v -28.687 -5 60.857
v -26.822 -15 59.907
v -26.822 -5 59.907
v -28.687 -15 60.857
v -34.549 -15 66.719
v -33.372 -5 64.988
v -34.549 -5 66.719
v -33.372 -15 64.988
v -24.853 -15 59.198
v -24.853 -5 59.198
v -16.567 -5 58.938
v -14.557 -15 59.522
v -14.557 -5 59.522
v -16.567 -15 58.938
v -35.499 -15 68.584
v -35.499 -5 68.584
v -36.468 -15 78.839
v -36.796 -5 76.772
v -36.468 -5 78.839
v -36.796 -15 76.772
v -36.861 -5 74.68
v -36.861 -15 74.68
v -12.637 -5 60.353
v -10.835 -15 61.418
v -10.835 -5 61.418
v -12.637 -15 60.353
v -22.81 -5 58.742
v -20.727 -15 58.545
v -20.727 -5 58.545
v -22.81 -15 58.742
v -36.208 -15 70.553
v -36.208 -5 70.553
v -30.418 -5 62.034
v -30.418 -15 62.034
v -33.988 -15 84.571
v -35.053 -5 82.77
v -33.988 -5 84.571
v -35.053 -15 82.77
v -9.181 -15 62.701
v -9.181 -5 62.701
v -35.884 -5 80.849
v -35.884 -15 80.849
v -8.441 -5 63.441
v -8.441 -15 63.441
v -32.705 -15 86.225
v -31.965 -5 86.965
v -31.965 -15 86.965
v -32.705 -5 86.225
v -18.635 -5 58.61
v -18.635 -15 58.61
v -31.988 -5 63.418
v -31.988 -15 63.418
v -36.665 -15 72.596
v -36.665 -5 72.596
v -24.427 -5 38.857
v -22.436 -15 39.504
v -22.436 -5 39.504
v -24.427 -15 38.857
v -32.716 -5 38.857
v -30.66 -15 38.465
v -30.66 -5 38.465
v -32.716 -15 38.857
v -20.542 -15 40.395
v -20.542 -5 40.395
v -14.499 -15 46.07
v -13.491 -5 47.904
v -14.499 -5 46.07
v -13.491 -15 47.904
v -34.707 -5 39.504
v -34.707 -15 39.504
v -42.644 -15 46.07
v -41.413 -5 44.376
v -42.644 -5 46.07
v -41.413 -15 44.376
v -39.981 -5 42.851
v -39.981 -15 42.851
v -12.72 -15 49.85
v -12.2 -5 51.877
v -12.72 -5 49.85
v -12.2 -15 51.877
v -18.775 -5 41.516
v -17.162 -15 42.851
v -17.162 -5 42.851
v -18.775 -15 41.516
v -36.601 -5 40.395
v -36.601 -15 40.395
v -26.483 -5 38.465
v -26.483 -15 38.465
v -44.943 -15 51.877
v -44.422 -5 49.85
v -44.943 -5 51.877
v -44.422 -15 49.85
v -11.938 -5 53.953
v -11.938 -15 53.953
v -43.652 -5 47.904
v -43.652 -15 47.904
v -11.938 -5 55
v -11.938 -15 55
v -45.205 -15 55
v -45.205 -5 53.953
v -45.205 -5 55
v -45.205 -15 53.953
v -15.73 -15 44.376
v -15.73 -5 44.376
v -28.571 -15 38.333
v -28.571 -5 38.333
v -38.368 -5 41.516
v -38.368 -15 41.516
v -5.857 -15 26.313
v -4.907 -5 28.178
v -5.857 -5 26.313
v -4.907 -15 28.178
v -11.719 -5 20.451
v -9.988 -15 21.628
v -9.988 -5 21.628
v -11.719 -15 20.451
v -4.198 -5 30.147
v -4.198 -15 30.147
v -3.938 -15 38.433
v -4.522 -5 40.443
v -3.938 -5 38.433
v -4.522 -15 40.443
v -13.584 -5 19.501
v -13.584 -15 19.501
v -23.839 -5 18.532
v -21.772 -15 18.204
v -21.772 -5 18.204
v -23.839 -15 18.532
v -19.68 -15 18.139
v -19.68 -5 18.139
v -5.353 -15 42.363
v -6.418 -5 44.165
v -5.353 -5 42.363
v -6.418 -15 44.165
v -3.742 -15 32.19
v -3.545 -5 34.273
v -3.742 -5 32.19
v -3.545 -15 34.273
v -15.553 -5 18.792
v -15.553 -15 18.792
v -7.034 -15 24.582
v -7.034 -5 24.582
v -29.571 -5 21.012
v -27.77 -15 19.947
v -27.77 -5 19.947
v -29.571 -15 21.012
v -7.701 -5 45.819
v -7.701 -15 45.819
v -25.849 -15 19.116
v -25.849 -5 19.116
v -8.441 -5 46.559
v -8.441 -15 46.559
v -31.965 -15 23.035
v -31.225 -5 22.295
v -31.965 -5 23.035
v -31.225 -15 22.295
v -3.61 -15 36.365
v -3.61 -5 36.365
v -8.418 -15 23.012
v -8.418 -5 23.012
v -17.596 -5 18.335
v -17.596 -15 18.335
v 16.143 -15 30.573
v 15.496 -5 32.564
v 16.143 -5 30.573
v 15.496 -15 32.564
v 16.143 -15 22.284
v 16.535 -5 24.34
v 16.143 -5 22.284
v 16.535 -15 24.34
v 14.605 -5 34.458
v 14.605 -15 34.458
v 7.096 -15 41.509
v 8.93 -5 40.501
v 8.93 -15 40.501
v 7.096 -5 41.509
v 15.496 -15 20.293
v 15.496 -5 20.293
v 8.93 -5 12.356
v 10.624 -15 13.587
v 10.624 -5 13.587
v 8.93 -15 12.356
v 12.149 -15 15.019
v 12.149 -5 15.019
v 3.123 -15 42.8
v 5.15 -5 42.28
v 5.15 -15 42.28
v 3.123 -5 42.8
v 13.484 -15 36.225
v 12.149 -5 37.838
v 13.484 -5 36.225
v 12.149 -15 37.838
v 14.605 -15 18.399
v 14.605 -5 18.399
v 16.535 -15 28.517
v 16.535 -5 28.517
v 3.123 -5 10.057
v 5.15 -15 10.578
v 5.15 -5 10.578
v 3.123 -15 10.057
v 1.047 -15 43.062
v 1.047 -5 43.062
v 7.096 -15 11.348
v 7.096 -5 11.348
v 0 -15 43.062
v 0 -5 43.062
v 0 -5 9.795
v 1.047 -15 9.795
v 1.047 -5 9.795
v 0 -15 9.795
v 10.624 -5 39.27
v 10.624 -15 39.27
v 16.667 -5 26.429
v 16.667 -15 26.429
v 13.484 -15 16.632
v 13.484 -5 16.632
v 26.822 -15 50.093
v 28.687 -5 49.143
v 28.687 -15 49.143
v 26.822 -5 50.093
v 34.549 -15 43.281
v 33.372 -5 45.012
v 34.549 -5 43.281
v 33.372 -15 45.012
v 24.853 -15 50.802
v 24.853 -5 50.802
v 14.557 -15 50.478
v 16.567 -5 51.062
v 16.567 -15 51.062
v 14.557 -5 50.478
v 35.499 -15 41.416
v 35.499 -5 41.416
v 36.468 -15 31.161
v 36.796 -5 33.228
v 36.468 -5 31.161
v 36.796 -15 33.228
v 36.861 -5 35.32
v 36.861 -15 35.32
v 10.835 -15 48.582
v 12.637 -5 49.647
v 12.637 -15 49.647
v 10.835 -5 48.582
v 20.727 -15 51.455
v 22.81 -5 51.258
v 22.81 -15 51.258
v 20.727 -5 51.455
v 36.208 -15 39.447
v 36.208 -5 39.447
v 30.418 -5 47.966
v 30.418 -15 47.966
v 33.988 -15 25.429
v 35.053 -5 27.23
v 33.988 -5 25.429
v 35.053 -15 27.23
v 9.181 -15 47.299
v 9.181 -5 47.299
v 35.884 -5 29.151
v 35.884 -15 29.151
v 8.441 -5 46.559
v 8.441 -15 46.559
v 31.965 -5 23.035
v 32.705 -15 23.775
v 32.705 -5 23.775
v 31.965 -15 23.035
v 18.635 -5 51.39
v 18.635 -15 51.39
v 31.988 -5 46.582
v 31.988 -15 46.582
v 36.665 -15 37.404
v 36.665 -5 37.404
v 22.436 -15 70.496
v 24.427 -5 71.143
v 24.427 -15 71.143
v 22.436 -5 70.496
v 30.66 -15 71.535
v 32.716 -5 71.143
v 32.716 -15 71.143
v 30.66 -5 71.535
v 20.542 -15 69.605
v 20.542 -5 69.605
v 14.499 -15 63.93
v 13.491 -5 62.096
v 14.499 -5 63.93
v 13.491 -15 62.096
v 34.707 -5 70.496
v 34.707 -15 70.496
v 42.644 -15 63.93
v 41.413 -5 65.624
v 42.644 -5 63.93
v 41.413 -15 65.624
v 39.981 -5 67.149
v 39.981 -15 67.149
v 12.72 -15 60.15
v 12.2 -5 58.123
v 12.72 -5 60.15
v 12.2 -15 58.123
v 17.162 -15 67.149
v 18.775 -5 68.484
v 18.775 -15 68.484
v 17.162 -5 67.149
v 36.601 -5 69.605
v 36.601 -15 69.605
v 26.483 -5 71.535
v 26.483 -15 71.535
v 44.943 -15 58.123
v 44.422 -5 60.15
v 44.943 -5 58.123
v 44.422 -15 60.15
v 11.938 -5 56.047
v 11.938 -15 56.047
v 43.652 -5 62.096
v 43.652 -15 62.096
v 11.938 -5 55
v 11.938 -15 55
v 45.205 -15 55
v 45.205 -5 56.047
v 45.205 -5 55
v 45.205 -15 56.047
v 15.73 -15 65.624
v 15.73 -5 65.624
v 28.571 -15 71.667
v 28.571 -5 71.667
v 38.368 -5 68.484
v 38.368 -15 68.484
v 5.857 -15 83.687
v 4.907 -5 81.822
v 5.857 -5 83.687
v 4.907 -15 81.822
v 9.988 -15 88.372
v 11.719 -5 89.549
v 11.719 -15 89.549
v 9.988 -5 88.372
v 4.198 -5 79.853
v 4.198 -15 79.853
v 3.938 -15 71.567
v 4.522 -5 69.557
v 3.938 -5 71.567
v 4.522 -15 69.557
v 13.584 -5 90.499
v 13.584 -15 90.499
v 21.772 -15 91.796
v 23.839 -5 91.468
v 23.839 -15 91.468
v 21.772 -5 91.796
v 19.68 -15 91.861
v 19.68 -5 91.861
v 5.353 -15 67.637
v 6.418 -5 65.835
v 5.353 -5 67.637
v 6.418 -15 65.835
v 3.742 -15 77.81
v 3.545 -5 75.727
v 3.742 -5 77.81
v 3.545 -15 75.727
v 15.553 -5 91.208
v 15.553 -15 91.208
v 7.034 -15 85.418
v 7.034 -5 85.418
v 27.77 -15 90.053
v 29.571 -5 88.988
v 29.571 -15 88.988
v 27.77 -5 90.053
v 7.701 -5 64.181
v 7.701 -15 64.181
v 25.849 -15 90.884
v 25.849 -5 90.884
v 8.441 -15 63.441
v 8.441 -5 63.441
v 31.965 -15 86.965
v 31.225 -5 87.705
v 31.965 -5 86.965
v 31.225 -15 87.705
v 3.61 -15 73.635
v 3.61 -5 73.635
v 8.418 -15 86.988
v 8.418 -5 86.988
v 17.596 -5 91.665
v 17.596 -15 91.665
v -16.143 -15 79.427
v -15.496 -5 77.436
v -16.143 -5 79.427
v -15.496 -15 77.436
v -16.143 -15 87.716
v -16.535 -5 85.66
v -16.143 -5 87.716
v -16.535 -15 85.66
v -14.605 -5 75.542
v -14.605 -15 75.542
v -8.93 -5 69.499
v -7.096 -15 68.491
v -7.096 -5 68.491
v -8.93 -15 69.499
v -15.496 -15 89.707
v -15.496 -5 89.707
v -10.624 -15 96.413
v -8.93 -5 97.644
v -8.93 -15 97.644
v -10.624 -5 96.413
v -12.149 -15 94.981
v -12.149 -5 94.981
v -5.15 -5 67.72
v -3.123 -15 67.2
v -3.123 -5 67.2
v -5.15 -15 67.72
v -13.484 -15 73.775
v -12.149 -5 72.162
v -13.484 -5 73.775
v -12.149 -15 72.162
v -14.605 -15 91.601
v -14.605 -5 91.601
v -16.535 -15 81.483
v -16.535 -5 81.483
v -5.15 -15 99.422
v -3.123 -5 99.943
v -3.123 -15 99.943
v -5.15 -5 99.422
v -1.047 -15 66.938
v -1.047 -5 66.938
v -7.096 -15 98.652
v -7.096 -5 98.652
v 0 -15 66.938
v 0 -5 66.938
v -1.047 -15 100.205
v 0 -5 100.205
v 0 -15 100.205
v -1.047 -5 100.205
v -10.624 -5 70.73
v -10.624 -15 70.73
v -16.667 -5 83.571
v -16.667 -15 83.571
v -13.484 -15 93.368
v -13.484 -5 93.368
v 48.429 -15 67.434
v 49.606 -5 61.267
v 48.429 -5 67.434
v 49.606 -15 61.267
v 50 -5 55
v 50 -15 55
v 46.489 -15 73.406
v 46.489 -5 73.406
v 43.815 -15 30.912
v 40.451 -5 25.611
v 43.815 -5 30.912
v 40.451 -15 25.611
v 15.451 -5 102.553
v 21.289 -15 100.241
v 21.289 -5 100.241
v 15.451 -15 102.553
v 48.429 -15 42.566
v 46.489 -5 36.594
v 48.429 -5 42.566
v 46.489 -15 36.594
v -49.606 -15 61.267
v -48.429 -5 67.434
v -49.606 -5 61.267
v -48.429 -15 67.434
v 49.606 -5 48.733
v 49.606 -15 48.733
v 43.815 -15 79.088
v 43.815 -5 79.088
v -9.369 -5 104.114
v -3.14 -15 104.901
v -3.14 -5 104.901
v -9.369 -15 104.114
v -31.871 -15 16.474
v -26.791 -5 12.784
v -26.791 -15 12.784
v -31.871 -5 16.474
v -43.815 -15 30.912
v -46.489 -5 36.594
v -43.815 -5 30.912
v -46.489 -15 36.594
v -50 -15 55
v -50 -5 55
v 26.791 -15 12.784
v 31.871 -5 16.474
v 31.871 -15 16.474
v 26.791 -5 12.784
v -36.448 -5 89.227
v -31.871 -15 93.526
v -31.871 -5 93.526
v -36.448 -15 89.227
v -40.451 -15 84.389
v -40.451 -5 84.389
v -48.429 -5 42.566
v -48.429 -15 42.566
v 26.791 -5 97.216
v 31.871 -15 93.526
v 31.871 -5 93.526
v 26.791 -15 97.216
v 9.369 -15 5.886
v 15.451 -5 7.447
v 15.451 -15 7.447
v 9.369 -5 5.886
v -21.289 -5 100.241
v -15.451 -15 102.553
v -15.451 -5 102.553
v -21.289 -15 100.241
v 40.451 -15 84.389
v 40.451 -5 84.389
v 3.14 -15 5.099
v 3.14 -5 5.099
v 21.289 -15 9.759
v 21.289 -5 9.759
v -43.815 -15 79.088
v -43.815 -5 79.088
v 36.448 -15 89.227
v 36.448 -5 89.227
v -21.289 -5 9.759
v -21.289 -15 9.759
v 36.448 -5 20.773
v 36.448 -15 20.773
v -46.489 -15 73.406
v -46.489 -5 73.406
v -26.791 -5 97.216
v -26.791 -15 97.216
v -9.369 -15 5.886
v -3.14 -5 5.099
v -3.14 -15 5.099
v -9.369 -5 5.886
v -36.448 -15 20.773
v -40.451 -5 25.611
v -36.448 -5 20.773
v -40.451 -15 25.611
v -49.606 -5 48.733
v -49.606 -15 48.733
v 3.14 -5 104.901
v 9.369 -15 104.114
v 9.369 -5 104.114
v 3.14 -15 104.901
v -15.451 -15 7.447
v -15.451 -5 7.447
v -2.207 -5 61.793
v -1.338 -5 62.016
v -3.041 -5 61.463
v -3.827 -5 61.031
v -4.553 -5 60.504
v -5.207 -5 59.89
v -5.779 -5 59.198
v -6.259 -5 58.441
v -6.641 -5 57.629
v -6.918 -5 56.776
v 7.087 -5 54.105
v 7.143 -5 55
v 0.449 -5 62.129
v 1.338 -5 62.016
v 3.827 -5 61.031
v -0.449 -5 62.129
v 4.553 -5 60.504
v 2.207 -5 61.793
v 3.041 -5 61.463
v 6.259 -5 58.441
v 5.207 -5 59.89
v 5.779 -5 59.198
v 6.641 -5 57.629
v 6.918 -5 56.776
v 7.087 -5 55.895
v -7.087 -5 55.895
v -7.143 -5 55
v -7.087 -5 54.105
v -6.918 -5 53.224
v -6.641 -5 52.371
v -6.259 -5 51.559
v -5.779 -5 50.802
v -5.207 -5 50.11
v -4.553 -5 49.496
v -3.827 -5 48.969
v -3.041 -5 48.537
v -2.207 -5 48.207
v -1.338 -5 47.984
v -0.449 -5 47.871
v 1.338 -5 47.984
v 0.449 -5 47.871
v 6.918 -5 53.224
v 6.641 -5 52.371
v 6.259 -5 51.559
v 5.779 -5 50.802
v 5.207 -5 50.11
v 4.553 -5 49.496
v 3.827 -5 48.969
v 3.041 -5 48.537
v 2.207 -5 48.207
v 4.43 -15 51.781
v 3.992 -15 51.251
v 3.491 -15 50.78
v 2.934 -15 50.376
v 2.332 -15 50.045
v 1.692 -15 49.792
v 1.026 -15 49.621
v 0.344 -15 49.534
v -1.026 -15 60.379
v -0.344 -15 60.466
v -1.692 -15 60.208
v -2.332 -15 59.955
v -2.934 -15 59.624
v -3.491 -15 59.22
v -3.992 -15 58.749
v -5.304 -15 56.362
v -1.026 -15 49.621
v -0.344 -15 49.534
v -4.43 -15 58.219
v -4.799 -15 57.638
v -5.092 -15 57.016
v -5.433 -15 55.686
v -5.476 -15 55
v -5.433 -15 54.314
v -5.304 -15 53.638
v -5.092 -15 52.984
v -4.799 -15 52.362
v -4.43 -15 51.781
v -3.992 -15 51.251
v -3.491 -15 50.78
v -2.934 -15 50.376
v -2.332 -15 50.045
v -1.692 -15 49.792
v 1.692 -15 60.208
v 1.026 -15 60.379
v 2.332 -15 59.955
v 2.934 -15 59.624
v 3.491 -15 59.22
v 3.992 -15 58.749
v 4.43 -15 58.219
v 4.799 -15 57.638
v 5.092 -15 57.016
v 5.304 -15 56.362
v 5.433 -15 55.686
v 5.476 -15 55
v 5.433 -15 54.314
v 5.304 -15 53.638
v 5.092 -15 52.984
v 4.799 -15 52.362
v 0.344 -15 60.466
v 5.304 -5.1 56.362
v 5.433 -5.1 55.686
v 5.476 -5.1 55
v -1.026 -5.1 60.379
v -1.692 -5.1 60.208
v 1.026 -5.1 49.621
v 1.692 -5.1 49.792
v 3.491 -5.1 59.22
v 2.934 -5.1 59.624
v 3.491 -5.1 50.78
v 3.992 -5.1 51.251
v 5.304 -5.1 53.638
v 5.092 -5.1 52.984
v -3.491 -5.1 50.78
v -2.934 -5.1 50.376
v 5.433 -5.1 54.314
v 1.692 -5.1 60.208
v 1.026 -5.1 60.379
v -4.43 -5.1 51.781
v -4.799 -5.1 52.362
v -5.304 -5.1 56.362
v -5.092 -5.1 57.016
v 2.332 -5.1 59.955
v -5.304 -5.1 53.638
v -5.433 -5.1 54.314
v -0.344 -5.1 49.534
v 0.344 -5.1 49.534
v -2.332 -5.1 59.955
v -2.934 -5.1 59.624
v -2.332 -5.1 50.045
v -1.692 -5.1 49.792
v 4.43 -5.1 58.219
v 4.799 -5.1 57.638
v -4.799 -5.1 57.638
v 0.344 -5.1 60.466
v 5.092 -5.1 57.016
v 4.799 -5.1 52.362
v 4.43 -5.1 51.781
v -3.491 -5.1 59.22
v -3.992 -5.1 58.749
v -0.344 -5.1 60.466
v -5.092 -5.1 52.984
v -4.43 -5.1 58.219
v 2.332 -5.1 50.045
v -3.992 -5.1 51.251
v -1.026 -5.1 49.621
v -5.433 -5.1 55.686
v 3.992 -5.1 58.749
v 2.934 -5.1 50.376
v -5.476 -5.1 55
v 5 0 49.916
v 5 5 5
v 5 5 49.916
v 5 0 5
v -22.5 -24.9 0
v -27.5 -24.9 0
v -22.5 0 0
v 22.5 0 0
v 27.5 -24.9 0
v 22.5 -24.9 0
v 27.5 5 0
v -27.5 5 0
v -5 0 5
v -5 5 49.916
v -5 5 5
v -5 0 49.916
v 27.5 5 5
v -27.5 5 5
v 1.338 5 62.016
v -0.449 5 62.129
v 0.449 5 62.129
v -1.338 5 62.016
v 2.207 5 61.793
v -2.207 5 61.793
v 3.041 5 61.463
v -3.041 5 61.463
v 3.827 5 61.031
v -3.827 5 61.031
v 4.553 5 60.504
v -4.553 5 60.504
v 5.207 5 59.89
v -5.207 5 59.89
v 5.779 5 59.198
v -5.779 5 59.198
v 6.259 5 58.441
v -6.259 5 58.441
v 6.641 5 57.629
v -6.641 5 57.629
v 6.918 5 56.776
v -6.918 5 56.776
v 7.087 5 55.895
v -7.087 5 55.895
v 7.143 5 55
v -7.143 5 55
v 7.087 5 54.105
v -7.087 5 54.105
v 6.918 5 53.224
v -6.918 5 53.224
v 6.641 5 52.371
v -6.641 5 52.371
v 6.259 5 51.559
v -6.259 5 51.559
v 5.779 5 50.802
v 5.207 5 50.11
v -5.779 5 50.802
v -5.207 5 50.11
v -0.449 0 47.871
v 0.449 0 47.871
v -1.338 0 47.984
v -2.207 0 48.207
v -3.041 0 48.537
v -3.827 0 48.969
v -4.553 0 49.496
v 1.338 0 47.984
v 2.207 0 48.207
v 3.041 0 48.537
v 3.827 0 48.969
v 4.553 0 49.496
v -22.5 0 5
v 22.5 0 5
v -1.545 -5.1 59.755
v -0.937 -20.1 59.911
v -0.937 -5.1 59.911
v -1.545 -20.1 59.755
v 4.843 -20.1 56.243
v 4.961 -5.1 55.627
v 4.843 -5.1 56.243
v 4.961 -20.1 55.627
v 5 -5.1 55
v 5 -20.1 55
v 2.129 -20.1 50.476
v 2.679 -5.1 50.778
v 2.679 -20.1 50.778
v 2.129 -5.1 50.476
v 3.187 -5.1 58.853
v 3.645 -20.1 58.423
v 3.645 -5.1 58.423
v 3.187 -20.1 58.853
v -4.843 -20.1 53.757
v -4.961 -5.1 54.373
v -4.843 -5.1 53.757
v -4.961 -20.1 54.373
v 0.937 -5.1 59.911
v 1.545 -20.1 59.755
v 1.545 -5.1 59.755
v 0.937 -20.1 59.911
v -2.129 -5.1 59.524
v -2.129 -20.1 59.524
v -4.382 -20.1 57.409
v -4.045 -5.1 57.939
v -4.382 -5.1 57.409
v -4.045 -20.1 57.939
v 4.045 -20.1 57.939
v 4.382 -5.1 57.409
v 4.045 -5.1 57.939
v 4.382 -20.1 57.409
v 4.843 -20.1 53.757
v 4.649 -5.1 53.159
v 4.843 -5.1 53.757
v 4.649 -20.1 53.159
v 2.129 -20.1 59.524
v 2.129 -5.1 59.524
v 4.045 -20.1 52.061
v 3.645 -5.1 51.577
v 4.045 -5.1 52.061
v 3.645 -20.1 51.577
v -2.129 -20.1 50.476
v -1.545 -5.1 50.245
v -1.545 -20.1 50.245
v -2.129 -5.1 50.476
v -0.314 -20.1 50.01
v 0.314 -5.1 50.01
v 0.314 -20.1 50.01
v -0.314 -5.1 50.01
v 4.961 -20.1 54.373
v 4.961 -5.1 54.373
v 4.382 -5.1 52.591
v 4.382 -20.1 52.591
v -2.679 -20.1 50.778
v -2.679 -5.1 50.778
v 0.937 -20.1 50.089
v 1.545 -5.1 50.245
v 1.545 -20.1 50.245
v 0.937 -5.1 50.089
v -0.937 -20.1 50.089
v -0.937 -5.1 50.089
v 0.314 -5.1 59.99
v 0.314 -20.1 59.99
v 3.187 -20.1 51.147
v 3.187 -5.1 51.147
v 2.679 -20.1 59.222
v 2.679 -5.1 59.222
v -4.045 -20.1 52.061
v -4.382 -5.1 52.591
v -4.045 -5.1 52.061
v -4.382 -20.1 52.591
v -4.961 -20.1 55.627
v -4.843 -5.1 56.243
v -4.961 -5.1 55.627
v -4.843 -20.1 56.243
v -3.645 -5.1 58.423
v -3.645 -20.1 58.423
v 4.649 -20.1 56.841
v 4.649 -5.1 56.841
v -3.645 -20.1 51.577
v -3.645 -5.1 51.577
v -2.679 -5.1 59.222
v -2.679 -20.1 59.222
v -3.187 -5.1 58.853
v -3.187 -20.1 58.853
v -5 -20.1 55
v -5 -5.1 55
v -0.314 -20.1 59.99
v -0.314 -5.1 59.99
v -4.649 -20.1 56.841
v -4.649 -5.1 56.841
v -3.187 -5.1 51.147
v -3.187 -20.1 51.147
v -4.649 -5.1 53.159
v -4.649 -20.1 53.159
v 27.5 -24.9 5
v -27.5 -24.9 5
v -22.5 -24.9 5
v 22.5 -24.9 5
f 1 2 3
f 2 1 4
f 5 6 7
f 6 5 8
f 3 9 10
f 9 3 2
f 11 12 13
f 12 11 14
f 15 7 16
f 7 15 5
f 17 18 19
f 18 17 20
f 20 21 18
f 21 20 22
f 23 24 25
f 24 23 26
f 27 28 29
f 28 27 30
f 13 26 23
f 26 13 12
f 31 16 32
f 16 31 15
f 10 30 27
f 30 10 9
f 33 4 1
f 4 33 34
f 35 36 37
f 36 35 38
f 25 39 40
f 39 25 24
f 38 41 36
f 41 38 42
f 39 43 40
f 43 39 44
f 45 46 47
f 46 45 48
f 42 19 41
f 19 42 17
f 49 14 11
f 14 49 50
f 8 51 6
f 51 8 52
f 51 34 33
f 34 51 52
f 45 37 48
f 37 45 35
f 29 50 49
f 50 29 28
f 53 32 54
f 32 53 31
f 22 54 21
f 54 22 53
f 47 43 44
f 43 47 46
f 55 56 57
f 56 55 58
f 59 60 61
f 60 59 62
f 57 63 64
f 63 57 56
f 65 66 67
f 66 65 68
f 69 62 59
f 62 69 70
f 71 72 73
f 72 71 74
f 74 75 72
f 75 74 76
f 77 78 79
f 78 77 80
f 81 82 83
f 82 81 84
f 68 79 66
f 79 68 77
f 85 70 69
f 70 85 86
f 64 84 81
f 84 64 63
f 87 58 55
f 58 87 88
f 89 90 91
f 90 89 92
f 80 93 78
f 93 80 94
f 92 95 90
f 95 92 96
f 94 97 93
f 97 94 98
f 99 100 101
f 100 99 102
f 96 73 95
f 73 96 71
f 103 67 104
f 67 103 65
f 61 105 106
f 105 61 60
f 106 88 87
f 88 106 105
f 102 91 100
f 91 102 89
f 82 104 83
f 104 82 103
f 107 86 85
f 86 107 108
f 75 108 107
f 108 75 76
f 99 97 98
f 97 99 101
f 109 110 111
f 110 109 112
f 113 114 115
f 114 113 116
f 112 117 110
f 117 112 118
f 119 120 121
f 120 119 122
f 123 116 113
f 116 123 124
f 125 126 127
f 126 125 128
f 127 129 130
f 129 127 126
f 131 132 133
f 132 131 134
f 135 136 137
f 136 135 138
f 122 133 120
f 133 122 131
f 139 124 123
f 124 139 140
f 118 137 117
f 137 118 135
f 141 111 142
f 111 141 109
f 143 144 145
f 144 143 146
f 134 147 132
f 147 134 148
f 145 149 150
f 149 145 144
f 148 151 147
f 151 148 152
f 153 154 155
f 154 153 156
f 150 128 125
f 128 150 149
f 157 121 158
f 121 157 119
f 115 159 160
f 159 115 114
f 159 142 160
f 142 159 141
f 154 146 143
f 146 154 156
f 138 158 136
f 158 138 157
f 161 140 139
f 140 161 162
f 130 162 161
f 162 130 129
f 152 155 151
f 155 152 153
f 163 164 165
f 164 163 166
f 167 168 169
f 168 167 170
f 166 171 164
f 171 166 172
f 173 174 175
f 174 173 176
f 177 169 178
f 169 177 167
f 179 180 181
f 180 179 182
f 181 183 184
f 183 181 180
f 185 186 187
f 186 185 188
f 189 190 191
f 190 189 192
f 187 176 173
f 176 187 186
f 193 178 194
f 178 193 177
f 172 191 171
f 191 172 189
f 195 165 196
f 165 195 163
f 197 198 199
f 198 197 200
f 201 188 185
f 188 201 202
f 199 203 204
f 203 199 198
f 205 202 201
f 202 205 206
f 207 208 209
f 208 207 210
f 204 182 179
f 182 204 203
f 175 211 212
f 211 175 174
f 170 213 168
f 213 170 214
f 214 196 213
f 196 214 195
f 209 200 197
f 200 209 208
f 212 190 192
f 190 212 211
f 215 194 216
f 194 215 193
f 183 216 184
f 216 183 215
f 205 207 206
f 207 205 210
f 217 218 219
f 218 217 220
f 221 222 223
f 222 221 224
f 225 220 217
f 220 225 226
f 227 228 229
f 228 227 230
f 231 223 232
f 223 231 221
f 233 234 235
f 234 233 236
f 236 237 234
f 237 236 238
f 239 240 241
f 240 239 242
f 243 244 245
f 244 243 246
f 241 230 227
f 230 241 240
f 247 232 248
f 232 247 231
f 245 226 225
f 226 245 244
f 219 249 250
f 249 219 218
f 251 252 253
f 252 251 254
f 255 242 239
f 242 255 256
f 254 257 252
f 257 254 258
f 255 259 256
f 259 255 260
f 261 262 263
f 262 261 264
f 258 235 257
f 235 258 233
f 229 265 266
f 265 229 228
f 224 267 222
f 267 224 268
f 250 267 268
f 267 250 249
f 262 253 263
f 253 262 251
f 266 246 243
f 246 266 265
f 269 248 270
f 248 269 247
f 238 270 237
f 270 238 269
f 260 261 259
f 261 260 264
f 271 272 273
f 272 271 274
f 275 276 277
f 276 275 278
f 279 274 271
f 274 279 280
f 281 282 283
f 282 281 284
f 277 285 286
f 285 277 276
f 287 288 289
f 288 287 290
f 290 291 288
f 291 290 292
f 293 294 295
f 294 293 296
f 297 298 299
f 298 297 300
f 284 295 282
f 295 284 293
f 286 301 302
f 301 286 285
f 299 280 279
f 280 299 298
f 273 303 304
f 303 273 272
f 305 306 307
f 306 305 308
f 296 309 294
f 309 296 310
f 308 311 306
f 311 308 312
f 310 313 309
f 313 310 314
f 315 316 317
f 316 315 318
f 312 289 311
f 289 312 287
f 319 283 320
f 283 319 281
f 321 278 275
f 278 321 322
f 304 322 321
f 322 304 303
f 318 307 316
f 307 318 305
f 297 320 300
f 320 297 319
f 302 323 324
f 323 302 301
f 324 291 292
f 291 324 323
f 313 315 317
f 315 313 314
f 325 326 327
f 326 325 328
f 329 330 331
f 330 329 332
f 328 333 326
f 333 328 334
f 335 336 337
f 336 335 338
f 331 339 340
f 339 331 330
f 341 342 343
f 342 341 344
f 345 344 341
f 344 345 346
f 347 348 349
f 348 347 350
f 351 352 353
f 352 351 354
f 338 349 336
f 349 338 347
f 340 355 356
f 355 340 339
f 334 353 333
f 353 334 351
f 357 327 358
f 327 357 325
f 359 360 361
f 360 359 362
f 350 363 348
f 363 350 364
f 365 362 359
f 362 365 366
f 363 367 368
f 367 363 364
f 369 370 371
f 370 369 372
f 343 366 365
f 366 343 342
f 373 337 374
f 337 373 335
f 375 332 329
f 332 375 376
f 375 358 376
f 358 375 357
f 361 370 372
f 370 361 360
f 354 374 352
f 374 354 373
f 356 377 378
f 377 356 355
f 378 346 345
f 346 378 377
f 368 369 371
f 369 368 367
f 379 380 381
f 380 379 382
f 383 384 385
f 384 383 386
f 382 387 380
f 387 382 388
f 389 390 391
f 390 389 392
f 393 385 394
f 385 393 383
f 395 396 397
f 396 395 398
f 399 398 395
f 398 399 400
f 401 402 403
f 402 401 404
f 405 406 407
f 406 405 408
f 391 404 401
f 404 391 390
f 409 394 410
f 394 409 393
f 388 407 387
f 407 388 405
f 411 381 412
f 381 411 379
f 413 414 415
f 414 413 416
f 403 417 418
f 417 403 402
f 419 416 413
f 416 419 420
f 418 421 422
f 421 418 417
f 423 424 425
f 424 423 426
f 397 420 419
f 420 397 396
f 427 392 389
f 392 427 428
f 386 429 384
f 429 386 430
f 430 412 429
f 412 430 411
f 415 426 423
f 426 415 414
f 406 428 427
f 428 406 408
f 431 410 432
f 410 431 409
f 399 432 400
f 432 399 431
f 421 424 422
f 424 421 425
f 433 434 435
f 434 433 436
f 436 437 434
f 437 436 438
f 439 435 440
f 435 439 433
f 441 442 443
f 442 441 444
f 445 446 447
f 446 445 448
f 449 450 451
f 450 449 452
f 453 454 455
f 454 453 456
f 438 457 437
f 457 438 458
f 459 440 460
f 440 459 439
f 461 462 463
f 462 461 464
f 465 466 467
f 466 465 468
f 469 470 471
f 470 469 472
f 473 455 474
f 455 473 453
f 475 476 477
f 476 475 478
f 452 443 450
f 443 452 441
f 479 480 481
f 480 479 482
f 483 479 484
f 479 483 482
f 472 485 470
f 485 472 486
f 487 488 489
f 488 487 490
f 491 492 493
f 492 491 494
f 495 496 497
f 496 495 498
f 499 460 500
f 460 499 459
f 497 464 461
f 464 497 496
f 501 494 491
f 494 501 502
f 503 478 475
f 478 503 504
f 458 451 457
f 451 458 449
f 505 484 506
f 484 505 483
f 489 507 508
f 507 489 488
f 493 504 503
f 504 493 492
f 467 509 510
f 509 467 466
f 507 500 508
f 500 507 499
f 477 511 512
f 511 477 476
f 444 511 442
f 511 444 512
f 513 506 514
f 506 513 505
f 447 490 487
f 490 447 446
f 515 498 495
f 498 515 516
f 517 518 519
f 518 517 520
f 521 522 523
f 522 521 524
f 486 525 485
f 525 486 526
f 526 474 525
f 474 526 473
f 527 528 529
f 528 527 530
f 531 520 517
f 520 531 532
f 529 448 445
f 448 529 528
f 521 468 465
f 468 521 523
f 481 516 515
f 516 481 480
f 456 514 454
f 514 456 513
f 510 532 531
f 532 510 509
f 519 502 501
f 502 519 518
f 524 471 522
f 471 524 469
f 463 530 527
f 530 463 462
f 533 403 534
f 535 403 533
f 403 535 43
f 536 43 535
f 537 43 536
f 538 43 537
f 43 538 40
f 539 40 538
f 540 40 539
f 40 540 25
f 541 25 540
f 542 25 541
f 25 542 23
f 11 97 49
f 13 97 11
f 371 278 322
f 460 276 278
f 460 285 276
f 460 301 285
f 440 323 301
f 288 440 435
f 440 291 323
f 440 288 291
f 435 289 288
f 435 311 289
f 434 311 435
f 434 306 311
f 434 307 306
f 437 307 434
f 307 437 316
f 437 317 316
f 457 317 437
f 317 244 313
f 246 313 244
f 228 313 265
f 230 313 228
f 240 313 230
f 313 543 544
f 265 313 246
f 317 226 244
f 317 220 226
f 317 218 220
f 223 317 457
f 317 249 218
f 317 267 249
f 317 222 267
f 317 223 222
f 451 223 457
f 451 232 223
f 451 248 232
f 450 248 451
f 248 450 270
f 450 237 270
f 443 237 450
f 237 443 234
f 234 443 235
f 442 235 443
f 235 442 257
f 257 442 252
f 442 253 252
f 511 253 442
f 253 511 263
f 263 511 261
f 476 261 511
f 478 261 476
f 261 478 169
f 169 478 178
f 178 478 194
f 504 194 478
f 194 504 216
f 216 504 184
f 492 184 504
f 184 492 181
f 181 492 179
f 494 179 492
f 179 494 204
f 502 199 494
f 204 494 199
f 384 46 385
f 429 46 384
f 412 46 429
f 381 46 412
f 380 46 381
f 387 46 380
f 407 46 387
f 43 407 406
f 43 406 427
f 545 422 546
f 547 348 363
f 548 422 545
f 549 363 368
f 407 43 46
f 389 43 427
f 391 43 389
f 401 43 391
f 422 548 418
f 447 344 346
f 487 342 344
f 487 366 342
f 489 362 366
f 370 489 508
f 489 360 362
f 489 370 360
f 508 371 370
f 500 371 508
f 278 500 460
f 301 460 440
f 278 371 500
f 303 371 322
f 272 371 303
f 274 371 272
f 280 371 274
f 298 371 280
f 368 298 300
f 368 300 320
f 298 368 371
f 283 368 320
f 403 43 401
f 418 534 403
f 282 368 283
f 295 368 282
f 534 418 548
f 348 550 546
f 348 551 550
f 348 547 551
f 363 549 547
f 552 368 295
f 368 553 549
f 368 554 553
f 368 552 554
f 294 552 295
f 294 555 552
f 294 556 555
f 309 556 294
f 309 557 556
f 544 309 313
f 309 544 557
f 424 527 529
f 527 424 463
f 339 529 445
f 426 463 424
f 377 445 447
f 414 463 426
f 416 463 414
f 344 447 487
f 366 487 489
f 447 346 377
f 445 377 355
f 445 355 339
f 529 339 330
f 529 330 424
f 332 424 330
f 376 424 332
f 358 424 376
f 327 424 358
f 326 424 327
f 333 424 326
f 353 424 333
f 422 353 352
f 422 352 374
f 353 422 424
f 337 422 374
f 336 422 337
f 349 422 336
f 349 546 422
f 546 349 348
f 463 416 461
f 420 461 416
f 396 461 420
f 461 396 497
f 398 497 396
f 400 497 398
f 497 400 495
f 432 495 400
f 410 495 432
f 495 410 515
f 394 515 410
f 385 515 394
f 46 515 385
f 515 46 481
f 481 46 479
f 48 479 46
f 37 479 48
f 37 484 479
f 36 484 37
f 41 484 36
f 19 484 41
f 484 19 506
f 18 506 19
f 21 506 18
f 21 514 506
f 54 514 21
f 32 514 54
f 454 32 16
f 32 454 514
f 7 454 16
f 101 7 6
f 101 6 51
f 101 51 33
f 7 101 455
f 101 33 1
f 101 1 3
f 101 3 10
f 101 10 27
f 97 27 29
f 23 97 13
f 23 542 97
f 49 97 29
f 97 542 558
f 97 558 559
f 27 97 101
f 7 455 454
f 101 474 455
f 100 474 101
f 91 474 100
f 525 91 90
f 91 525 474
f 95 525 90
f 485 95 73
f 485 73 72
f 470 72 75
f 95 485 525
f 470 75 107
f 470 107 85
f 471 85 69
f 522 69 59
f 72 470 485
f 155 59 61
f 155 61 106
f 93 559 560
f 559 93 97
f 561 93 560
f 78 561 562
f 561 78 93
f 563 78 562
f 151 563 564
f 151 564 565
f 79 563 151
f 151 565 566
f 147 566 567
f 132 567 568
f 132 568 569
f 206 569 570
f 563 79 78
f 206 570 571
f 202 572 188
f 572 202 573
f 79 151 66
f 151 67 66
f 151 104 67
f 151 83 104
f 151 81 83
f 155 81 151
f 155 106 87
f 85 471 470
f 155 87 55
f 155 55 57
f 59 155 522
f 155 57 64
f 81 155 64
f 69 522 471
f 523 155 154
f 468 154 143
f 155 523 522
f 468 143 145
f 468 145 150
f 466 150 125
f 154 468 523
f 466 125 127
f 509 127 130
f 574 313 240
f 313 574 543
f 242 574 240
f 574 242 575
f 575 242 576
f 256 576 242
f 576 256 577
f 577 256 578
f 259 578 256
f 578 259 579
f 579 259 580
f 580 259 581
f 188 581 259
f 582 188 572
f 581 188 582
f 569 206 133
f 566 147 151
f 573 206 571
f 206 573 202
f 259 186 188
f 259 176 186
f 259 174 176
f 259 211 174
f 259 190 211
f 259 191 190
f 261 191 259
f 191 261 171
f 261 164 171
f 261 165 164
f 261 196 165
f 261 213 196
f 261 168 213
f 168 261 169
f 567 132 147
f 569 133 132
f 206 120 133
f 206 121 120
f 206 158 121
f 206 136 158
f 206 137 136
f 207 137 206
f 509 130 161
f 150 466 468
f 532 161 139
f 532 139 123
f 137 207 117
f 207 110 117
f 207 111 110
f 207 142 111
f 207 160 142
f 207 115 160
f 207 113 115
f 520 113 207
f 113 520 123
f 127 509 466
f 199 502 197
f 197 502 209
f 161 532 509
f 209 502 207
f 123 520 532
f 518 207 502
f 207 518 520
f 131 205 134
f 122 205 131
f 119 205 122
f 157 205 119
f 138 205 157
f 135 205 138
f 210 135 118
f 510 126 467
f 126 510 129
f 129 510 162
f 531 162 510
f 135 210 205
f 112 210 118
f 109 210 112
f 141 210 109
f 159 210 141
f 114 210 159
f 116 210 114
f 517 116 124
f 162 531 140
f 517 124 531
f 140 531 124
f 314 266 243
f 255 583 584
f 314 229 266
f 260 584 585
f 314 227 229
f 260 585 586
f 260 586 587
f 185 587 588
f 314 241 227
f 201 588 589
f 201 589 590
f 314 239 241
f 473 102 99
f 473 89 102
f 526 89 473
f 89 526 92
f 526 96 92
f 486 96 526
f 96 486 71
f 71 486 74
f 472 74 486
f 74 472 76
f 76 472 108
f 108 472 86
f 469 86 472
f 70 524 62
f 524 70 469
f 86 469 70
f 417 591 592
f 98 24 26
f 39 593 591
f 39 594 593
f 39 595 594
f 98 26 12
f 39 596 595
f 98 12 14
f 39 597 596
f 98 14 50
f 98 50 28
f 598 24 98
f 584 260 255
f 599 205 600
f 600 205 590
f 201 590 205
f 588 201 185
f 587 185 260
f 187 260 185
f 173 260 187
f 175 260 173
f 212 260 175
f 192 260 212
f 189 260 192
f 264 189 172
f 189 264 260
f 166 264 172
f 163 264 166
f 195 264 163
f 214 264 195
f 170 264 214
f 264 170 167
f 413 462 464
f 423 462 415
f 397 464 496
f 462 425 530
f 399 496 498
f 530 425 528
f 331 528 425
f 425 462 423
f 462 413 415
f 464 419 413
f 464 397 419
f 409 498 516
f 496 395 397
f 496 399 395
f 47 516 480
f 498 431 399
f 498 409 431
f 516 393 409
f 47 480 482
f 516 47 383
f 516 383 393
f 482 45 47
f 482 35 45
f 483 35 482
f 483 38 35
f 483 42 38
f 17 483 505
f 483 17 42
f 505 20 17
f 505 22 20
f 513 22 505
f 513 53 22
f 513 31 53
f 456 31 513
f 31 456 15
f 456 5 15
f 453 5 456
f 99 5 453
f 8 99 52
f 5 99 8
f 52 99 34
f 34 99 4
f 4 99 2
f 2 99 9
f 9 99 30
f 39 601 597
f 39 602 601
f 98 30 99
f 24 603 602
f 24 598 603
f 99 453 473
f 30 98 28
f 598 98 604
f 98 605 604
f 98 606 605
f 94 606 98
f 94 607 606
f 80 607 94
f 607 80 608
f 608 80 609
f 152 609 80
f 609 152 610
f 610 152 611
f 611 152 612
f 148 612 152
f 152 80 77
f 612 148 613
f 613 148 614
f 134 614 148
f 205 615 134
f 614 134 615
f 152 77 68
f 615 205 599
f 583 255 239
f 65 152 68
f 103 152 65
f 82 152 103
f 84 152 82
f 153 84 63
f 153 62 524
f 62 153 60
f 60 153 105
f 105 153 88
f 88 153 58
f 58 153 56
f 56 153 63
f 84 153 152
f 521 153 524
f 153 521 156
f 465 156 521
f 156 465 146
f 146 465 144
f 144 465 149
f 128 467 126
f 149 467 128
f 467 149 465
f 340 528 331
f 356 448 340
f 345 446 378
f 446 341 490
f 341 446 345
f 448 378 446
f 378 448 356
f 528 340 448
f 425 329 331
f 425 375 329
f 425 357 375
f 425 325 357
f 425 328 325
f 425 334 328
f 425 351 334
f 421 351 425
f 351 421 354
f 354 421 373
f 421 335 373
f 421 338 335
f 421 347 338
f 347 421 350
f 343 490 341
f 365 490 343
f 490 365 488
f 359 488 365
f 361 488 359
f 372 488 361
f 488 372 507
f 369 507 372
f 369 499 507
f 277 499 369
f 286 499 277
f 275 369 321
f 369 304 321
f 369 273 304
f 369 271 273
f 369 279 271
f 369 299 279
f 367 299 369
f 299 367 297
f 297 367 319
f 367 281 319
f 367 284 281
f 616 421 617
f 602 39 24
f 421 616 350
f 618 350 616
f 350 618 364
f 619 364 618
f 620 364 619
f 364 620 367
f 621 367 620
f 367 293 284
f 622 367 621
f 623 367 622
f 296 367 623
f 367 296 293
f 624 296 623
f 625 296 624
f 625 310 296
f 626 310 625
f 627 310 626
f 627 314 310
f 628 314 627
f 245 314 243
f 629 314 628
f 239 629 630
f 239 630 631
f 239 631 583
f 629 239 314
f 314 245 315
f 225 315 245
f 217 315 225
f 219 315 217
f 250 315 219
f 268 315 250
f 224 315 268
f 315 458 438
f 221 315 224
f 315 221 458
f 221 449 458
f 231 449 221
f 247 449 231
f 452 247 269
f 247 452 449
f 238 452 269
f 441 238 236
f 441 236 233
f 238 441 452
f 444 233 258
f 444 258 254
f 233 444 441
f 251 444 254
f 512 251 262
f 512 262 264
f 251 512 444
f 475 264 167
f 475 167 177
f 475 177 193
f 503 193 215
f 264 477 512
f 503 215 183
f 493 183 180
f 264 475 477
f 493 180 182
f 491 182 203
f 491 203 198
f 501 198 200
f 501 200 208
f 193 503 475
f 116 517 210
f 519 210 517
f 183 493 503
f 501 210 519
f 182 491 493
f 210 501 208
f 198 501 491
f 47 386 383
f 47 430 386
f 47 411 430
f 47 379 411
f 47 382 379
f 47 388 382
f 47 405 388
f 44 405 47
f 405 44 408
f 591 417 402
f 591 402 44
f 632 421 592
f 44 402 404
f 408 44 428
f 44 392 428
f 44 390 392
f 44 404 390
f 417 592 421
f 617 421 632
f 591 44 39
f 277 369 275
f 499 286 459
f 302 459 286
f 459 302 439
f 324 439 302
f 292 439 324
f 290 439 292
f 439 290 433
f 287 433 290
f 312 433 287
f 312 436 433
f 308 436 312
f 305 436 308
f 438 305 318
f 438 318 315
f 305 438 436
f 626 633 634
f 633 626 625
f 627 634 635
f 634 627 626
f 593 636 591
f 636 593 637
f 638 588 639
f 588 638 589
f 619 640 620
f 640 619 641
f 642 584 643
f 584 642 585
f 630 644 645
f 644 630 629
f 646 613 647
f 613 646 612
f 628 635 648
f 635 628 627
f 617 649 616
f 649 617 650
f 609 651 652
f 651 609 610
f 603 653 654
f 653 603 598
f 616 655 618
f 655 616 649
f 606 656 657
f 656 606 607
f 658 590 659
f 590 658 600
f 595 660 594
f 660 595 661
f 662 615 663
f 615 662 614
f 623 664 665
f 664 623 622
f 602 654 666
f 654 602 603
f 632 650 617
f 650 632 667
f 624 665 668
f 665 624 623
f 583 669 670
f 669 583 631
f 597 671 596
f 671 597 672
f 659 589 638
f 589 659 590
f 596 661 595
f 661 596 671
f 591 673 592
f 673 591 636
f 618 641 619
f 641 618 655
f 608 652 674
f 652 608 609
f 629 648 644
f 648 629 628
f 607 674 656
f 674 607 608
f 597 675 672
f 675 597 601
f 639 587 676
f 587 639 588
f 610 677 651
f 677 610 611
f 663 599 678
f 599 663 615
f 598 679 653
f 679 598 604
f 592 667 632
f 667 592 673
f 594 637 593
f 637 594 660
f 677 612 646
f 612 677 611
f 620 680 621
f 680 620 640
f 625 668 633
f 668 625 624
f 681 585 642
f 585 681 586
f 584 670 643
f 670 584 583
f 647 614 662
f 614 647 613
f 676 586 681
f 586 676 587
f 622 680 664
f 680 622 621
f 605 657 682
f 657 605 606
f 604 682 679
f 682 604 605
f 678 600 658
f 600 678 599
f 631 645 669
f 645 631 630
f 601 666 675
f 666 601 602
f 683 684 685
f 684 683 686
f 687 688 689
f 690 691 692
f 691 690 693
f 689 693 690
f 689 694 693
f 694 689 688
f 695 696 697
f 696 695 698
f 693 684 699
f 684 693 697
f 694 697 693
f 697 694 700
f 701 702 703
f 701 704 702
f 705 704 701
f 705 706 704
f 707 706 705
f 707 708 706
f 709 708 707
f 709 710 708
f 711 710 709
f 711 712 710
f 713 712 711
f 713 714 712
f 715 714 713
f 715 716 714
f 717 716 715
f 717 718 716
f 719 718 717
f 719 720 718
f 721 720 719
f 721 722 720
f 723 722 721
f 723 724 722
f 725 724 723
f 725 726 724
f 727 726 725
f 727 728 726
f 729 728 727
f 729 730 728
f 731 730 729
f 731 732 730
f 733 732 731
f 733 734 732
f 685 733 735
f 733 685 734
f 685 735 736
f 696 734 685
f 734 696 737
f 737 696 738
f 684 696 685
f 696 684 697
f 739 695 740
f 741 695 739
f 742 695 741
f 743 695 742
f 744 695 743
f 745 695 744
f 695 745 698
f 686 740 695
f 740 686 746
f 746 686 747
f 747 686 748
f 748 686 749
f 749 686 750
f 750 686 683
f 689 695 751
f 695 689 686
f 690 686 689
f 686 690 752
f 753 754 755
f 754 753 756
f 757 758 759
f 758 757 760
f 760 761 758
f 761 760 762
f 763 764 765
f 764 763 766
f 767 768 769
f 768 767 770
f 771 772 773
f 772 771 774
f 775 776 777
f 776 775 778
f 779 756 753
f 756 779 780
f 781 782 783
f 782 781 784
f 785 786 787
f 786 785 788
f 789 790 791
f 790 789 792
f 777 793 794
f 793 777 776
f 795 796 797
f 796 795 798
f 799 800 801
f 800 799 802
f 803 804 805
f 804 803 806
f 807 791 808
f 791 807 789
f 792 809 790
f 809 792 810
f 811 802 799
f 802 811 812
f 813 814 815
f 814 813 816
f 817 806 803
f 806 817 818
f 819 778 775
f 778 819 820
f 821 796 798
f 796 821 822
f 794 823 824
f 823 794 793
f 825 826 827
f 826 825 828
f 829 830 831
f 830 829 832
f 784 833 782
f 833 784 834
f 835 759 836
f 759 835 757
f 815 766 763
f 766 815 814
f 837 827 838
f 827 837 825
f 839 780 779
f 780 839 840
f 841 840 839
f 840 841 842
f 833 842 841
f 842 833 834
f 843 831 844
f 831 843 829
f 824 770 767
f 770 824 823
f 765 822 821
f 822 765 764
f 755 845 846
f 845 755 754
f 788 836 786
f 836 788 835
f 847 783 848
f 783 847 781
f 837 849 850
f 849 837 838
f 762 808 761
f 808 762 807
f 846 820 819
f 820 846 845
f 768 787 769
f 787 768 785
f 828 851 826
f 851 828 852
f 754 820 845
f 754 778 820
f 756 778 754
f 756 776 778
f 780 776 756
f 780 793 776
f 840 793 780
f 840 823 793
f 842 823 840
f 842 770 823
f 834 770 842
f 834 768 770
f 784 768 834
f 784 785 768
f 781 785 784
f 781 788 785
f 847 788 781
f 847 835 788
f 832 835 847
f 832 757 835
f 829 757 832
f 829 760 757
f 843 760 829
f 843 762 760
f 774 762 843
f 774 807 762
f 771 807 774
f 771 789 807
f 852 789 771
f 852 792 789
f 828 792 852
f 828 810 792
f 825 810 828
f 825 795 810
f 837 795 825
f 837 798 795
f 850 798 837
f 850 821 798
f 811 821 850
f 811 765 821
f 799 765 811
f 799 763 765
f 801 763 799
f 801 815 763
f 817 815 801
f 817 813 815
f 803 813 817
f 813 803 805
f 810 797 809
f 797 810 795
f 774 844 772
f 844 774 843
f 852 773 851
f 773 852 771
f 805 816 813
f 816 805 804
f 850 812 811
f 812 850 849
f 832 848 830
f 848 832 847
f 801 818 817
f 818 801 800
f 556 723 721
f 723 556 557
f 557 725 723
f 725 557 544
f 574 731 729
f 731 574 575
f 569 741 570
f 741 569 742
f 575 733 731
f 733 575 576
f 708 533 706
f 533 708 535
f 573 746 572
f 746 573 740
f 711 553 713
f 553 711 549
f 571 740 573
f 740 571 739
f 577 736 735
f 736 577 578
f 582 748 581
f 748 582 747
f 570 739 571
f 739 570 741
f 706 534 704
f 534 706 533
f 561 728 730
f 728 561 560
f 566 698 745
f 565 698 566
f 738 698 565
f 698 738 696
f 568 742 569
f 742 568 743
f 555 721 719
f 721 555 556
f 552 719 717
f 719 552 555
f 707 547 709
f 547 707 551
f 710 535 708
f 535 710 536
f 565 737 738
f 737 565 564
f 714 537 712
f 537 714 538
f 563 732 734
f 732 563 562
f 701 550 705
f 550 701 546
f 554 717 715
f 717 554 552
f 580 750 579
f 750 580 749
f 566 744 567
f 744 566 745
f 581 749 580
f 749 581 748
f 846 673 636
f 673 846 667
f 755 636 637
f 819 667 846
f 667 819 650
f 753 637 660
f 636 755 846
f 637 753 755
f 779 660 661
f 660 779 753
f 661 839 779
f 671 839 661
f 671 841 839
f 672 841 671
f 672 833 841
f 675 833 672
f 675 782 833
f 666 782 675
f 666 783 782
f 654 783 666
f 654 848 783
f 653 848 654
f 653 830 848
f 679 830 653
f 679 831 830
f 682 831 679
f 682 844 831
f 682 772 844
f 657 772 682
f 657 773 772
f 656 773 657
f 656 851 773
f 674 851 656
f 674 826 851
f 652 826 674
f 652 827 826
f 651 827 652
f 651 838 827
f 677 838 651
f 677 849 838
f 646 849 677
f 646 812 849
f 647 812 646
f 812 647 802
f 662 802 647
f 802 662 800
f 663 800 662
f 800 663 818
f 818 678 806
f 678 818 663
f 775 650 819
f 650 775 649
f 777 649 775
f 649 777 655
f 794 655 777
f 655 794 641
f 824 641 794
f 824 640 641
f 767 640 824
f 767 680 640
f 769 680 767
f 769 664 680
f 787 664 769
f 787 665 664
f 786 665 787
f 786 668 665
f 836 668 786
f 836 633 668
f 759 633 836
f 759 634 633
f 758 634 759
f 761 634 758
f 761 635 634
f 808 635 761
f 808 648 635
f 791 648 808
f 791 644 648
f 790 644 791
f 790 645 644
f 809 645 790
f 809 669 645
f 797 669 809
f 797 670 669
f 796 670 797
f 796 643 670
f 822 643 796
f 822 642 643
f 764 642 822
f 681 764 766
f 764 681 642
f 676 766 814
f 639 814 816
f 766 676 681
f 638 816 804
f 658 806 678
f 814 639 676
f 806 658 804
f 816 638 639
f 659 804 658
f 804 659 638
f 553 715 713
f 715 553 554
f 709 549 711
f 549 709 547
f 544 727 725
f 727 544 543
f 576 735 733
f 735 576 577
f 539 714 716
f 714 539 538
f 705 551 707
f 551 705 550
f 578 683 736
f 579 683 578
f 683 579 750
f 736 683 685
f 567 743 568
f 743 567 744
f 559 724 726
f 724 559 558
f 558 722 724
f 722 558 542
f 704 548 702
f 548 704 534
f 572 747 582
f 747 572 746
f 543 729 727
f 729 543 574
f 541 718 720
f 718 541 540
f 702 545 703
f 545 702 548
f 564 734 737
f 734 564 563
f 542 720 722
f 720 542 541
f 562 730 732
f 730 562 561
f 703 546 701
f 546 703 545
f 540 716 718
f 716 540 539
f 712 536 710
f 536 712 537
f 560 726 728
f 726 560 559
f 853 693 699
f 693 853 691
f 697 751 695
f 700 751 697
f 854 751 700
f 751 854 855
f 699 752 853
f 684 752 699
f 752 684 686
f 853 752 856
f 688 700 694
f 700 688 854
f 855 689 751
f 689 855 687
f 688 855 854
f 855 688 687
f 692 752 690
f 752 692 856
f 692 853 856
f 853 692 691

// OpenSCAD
//Overbalanced wheel
$fn = 50;
mode = "preview"; //[preview, print]
num_of_holes = 8; //[3:9]
//Change size of wheel, other dependent parts change too.
wheel_size = 50; //[20:100]
wheel_thickness = 10; //[5:20]
fizz = 0.1;
fizzz = fizz*2;
rot = 360/num_of_holes;
dikte = wheel_size/10;

start();

module start(){
	if (mode == "print"){
		 color("green") wheel();
		translate([-wheel_size*1.8,-wheel_size*.5,dikte]) rotate(-90,[1,0,0]) color("blue") stand();
		translate([-wheel_size*1.8,wheel_size*1.3,0]) color("red") weights();
	} else {
		translate([0,-wheel_thickness/2,wheel_size + wheel_size/10]) rotate(90,[1,0,0]) color("green") wheel();
		color("blue")  stand();
	}
}

module weights(){
	for (nr=[1:num_of_holes]){
		translate([dikte*2.5*nr,0,0]) weight();
	}
}

module weight(){
	cylinder(wheel_thickness/2-fizzz,dikte,dikte);
	translate([0,0,wheel_thickness/2]) cylinder(wheel_thickness+fizzz*2, dikte/2, dikte/2);
	translate([0,0,wheel_thickness/2+wheel_thickness]) cylinder(wheel_thickness/2-fizzz,dikte,dikte);
}

module stand(){
	//vertical
	translate([-dikte,0,0]) cube([dikte*2,dikte,wheel_size + wheel_size/10]);
	//hangert
	translate([0,dikte,wheel_size + wheel_size/10]) rotate(90,[1,0,0]) cylinder(wheel_thickness*2+dikte+fizz,wheel_size/10,wheel_size/10);
	//tegenhouder
	translate([0,dikte,wheel_size + wheel_size/10]) rotate(90,[1,0,0]) cylinder(wheel_thickness/2+dikte+fizz,wheel_size/7,wheel_size/7);
	//horizontal
	trans_x = (wheel_size + wheel_size/10)/2;
	translate([-trans_x,0,0]) cube([wheel_size + wheel_size/10,dikte,dikte]);
	//pootjes
	translate([-trans_x,-(wheel_thickness*2.5)+fizz,0]) cube([dikte,wheel_thickness*2.5,dikte]);
	translate([trans_x - dikte,-(wheel_thickness*2.5)+fizz,0]) cube([dikte,wheel_thickness*2.5,dikte]);
}

module wheel(){
	difference(){
		cylinder(wheel_thickness, wheel_size, wheel_size);
		//Holes
		for (nr=[1:num_of_holes]){
			rotate(rot*nr,[0,0,1]) translate([0,wheel_size/1.75,0]) hole();
		}
		//Center
		translate([0,0,-fizz]) cylinder(wheel_thickness+fizzz,wheel_size/9.3+fizz,wheel_size/9.3+fizz);
	}
}

module hole(){
	difference(){
		translate([0,0,-fizz]) cylinder(wheel_thickness+fizzz, wheel_size/3, wheel_size/3);
		translate([0,-wheel_size/2,-fizzz]) cube([wheel_size,wheel_size,wheel_size]);
	}
}
